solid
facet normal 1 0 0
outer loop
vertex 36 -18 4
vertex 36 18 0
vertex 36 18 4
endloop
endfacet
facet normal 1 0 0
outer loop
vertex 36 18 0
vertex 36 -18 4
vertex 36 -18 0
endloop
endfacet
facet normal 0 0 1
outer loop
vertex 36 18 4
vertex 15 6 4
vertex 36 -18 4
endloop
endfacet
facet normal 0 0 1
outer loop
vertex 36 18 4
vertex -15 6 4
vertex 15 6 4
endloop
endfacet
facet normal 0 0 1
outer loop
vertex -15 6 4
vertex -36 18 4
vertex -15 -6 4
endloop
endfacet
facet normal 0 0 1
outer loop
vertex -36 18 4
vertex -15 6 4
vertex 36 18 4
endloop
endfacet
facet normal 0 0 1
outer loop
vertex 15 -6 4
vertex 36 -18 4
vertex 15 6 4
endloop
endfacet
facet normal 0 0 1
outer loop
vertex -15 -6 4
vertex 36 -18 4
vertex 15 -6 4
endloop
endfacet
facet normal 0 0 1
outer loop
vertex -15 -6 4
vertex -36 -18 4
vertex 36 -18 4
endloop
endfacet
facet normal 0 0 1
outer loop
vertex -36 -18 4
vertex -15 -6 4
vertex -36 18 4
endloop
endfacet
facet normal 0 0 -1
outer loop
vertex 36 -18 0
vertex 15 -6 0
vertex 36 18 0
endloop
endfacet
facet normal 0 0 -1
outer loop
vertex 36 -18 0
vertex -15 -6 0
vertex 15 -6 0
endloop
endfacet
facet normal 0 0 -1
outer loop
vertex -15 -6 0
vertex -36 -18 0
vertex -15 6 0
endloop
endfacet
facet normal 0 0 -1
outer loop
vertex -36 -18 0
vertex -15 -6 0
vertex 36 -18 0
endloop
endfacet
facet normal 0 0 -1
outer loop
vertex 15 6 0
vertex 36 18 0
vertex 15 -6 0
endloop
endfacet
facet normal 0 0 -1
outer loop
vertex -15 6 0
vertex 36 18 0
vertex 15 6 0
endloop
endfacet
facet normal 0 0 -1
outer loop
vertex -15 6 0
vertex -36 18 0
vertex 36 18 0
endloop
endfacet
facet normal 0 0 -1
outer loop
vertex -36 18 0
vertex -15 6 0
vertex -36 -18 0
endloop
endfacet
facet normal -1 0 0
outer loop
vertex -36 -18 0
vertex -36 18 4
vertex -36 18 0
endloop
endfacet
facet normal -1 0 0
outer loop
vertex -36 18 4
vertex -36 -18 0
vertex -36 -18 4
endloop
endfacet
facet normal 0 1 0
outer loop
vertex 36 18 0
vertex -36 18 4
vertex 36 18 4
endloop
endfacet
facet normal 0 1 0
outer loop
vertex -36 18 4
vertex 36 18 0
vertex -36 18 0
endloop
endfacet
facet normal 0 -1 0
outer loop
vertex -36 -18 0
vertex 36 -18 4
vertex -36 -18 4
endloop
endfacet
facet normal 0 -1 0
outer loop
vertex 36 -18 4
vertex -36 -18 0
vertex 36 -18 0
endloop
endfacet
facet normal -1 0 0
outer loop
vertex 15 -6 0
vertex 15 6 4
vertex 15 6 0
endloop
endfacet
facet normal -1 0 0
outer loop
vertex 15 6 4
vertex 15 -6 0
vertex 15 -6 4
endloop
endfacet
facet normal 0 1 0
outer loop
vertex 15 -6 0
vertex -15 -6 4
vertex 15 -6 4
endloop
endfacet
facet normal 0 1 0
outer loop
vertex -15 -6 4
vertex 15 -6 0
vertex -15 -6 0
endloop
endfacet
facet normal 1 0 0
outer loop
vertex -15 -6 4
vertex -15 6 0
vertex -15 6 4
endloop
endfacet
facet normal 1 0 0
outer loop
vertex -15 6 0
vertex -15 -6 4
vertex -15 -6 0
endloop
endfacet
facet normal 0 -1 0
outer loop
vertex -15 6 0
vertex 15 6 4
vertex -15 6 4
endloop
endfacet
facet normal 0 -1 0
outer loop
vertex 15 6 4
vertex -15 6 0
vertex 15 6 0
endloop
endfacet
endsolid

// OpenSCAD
// Generated with SolidPython2 for OpenSCAD task-035
$fn = 64;

difference() {
	translate(v = [-36.0, -18.0, 0]) {
		cube(size = [72, 36, 4]);
	}
	translate(v = [0, 0, -1]) {
		linear_extrude(height = 6) {
			scale(v = [0.5, 0.5, 1]) {
				import(file = "task-035_logo.dxf", origin = [0, 0]);
			}
		}
	}
}
